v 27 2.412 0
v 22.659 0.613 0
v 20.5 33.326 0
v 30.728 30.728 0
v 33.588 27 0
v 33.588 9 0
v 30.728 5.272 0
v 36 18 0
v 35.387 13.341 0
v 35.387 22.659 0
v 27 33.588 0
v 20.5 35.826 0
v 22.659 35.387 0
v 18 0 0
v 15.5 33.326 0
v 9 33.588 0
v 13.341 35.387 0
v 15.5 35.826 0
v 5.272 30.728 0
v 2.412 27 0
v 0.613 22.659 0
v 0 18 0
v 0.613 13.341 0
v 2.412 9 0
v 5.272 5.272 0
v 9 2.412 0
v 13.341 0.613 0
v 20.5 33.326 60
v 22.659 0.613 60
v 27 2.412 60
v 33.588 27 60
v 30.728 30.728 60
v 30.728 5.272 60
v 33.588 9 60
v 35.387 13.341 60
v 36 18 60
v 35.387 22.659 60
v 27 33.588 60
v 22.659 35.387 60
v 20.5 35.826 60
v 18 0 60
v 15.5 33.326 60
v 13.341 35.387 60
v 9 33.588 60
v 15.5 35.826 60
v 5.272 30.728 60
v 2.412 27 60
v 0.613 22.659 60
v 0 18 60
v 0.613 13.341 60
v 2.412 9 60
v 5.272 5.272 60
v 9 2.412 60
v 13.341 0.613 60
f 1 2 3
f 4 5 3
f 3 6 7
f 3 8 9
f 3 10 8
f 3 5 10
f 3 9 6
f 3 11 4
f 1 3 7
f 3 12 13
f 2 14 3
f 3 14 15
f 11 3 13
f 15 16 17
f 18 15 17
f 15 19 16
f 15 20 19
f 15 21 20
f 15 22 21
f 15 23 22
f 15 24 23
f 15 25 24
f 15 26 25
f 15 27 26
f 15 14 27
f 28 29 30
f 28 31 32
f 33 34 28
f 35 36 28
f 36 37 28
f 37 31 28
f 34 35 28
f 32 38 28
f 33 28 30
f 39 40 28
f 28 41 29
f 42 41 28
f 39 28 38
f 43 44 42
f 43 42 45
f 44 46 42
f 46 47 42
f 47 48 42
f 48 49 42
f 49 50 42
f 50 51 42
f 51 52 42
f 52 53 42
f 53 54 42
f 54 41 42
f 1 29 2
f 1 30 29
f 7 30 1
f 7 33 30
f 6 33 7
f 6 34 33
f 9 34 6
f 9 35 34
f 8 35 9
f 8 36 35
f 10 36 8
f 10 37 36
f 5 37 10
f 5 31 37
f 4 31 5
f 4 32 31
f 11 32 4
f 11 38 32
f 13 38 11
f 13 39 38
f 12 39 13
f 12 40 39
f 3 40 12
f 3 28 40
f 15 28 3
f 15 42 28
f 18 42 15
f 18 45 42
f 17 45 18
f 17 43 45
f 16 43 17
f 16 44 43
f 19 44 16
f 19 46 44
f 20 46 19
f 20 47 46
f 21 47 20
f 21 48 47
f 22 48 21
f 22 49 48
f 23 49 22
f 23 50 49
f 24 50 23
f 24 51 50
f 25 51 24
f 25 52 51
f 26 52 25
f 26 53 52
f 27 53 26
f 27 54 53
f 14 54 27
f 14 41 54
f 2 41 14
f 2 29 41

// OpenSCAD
$fn = 32;

// ----------------------------------------------------------------------
// Keyway shaft: d36 shaft, key 5 x 2.5 mm
// ----------------------------------------------------------------------

// --- parameters (mm) ---
shaft_r = 18;             // shaft radius
key_w = 5;                // keyway width
key_d = 2.5;              // keyway depth below the surface line
plate_t = 60;             // shaft length, Z (extrusion height)

shaft_d = 2 * shaft_r;  // shaft diameter
circle_step = 15;  // polygon sampling step, degrees

profile = [[13.341, 35.387], [9, 33.588], [5.272, 30.728], [2.412, 27], [0.613, 22.659], [0, 18], [0.613, 13.341], [2.412, 9], [5.272, 5.272], [9, 2.412], [13.341, 0.613], [18, 0], [22.659, 0.613], [27, 2.412], [30.728, 5.272], [33.588, 9], [35.387, 13.341], [36, 18], [35.387, 22.659], [33.588, 27], [30.728, 30.728], [27, 33.588], [22.659, 35.387], [20.5, 35.826], [20.5, 33.326], [15.5, 33.326], [15.5, 35.826]];  // primary outline, 27 points, counter clockwise

// --- the one profile operation ---
linear_extrude(height = plate_t) polygon(points = profile);
